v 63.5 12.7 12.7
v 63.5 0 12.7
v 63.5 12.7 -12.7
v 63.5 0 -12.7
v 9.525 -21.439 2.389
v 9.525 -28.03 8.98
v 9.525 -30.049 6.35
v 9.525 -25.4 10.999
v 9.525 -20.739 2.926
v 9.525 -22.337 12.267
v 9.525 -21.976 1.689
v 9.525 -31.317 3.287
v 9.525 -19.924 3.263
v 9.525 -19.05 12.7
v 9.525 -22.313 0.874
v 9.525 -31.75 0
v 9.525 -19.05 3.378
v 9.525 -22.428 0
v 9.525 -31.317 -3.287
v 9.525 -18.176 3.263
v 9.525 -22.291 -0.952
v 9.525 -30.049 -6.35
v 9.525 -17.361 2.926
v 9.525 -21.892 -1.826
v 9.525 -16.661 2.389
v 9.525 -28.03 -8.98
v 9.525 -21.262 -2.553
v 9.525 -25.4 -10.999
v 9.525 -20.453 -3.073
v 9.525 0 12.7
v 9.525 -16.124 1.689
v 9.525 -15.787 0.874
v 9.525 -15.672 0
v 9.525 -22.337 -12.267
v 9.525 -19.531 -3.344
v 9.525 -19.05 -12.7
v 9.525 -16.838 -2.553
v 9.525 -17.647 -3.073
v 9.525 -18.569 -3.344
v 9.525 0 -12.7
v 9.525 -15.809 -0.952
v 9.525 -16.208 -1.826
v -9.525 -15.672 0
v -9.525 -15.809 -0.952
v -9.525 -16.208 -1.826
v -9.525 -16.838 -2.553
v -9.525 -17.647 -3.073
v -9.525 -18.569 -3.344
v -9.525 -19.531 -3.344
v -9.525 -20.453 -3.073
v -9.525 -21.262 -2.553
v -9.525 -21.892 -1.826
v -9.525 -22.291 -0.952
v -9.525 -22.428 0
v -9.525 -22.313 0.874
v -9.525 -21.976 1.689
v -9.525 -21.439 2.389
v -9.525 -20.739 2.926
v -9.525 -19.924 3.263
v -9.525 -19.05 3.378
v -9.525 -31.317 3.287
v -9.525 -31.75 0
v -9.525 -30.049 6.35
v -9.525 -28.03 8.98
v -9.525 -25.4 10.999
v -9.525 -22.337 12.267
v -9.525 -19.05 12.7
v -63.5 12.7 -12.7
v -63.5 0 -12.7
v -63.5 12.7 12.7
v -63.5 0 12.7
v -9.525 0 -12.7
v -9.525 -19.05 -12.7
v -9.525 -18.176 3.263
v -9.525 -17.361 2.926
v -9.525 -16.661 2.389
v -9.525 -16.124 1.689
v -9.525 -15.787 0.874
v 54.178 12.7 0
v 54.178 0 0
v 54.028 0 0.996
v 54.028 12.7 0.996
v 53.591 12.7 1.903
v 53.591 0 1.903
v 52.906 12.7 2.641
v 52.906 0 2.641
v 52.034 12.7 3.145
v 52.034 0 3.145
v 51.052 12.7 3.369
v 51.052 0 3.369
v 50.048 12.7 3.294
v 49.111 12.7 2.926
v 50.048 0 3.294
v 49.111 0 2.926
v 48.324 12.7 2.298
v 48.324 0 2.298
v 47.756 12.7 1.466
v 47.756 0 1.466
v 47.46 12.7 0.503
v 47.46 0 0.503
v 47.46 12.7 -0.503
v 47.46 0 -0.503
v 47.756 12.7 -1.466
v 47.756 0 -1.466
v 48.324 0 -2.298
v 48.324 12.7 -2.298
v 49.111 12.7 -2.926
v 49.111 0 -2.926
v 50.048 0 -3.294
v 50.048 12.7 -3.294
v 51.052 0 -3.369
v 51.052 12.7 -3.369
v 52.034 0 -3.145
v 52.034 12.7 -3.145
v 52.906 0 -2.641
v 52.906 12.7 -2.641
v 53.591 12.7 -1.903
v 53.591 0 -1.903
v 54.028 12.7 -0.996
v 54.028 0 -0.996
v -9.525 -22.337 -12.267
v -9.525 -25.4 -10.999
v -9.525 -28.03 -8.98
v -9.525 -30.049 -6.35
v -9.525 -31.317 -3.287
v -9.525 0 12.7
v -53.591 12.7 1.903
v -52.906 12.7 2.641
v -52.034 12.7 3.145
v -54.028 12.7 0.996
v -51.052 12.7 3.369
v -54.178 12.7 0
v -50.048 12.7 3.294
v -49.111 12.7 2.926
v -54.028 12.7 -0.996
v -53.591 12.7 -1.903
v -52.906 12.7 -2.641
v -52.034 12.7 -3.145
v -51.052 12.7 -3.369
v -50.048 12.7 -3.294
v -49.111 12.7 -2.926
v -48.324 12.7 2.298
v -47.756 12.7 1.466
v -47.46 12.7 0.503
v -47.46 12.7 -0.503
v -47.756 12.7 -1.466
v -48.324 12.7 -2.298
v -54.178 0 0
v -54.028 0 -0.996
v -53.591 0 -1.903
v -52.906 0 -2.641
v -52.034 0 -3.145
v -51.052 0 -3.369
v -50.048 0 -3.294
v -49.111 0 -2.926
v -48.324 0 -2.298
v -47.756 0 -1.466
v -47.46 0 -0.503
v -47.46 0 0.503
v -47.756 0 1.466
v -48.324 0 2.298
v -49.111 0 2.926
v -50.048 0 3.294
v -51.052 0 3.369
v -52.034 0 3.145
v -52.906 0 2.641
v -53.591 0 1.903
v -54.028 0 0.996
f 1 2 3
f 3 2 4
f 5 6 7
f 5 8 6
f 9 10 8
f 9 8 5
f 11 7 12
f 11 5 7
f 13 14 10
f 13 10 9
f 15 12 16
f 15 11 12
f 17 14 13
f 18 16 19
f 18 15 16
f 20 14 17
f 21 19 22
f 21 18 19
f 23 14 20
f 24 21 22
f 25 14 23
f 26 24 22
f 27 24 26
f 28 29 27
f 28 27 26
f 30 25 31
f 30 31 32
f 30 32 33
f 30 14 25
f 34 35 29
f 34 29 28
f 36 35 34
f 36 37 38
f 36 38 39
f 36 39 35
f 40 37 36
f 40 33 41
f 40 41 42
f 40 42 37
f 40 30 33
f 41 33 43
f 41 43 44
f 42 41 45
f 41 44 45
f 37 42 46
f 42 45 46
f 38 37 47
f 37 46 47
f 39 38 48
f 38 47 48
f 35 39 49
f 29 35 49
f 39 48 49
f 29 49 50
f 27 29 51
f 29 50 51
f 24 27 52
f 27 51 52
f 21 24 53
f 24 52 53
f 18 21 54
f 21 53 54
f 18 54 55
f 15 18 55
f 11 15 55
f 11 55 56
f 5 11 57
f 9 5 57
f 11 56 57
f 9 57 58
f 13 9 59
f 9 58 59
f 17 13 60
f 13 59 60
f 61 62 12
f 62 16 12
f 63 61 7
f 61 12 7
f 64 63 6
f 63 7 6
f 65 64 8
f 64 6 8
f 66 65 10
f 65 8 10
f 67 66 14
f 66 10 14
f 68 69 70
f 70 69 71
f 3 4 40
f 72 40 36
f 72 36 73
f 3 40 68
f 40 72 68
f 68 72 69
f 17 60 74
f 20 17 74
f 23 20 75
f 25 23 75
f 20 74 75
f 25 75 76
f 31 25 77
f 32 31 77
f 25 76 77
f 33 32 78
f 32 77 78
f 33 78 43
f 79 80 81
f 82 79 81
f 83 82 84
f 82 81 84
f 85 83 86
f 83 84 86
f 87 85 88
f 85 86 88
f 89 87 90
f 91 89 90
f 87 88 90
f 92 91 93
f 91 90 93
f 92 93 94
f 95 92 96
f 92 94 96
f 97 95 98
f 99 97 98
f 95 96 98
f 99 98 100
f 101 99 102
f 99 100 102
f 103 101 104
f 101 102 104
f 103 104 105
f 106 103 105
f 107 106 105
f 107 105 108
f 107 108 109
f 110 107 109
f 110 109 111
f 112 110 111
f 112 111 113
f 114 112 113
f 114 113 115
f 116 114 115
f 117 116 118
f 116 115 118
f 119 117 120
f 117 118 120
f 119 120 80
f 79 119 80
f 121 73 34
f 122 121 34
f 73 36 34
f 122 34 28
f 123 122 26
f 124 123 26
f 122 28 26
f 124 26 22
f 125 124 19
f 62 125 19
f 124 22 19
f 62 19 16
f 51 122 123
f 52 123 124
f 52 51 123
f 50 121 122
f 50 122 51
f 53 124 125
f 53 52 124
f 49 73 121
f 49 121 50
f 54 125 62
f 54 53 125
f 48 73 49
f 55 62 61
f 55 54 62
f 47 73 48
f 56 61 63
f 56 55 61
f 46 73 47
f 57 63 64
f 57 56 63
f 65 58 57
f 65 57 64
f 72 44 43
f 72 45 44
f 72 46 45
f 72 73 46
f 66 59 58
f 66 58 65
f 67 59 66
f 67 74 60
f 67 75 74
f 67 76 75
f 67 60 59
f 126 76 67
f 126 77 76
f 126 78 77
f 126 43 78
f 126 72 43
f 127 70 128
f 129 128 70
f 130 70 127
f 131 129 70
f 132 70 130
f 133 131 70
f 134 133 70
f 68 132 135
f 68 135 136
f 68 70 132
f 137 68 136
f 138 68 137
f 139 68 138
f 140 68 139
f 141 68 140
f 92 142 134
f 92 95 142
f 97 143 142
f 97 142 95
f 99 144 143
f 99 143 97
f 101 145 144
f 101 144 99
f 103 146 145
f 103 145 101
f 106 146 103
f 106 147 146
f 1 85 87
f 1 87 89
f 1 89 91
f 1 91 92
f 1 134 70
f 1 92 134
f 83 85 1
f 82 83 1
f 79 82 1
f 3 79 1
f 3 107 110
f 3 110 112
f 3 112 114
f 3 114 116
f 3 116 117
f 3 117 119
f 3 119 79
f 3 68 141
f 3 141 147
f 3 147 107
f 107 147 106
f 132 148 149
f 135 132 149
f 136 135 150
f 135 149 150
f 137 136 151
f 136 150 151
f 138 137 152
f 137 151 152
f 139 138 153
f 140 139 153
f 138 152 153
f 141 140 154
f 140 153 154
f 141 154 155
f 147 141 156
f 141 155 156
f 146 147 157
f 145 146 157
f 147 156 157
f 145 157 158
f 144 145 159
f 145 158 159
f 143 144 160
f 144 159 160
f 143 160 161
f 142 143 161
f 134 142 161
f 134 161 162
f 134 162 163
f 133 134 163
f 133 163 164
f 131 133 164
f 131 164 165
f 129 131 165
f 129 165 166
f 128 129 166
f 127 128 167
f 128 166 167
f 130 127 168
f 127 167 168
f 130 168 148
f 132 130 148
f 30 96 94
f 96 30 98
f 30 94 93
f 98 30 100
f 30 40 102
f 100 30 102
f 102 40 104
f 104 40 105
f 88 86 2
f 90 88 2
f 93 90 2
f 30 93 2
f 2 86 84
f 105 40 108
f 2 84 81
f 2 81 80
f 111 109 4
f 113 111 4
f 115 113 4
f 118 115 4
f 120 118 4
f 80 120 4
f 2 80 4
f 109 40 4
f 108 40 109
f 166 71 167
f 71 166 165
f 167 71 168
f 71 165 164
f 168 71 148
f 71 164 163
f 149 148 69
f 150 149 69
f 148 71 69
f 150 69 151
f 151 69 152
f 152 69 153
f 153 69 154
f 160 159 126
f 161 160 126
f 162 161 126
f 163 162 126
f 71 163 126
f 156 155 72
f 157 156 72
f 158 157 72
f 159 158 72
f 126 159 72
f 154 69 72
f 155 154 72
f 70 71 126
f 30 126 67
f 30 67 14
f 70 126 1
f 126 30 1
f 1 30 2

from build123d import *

# Parameters (mm, degrees)
SKETCH1_W           = 19.05
SKETCH1_H           = 12.7
BOSS_EXTRUDE1_DEPTH = 12.7
SKETCH1_3_W         = 19.05
SKETCH1_3_H         = 12.7
BOSS_EXTRUDE2_DEPTH = 31.75
CUT_EXTRUDE1_DEPTH  = 81.63499938
FILLET1_R           = 12.7


with BuildPart() as part:
    # Sketch1 → Boss-Extrude1 (new body)
    with BuildSketch(Plane(origin=(0, 0, 0), x_dir=(1, 0, 0), z_dir=(0, 1, 0))):
        with BuildLine():
            Line((63.5, 12.7), (9.525, 12.7))
            Line((9.525, 12.7), (9.525, 0))
            Line((9.525, 0), (47.4218, 0))
            ThreePointArc((47.4218, 0), (50.8, 3.3782), (54.1782, 0))
            Line((54.1782, 0), (63.5, 0))
            Line((63.5, 0), (63.5, 12.7))
        make_face()
        with BuildLine():
            Line((47.4218, 0), (9.525, 0))
            Line((9.525, 0), (9.525, -12.7))
            Line((9.525, -12.7), (63.5, -12.7))
            Line((63.5, -12.7), (63.5, 0))
            Line((63.5, 0), (54.1782, 0))
            ThreePointArc((54.1782, 0), (50.8, -3.3782), (47.4218, 0))
        make_face()
        with Locations((0, -6.35)):
            Rectangle(SKETCH1_W, SKETCH1_H)
        with Locations((0, 6.35)):
            Rectangle(SKETCH1_W, SKETCH1_H)
        with BuildLine():
            Line((-54.1782, 0), (-63.5, 0))
            Line((-63.5, 0), (-63.5, -12.7))
            Line((-63.5, -12.7), (-9.525, -12.7))
            Line((-9.525, -12.7), (-9.525, 0))
            Line((-9.525, 0), (-47.4218, 0))
            ThreePointArc((-47.4218, 0), (-50.8, -3.3782), (-54.1782, 0))
        make_face()
        with BuildLine():
            Line((-9.525, 12.7), (-63.5, 12.7))
            Line((-63.5, 12.7), (-63.5, 0))
            Line((-63.5, 0), (-54.1782, 0))
            ThreePointArc((-54.1782, 0), (-50.8, 3.3782), (-47.4218, 0))
            Line((-47.4218, 0), (-9.525, 0))
            Line((-9.525, 0), (-9.525, 12.7))
        make_face()
    extrude(amount=BOSS_EXTRUDE1_DEPTH)

    # Sketch1<3> → Boss-Extrude2 (add)
    with BuildSketch(Plane(origin=(0, 0, 0), x_dir=(1, 0, 0), z_dir=(0, 1, 0))):
        with Locations((0, -6.35)):
            Rectangle(SKETCH1_3_W, SKETCH1_3_H)
        with Locations((0, 6.35)):
            Rectangle(SKETCH1_3_W, SKETCH1_3_H)
    extrude(amount=-BOSS_EXTRUDE2_DEPTH)

    # Sketch2 → Cut-Extrude1 (cut, through all)
    with BuildSketch(Plane.ZY.offset(9.525)):
        with BuildLine():
            ThreePointArc((3.3782, -19.05), (2.388748128, -16.661251872), (0, -15.6718))
            Line((0, -15.6718), (0, -22.4282))
            ThreePointArc((0, -22.4282), (2.388748128, -21.438748128), (3.3782, -19.05))
        make_face()
        with BuildLine():
            Line((0, -22.4282), (0, -15.6718))
            ThreePointArc((0, -15.6718), (-3.3782, -19.05), (0, -22.4282))
        make_face()
    extrude(amount=-CUT_EXTRUDE1_DEPTH, mode=Mode.SUBTRACT)

    # Fillet1
    fillet1_edges = [part.edges().sort_by_distance(p)[0] for p in [
        (0, -31.75, -12.7),
        (0, -31.75, 12.7),
    ]]
    fillet(fillet1_edges, radius=FILLET1_R - 0.0001)  # a hair under: the kernel refuses the full size


solid = part.part
